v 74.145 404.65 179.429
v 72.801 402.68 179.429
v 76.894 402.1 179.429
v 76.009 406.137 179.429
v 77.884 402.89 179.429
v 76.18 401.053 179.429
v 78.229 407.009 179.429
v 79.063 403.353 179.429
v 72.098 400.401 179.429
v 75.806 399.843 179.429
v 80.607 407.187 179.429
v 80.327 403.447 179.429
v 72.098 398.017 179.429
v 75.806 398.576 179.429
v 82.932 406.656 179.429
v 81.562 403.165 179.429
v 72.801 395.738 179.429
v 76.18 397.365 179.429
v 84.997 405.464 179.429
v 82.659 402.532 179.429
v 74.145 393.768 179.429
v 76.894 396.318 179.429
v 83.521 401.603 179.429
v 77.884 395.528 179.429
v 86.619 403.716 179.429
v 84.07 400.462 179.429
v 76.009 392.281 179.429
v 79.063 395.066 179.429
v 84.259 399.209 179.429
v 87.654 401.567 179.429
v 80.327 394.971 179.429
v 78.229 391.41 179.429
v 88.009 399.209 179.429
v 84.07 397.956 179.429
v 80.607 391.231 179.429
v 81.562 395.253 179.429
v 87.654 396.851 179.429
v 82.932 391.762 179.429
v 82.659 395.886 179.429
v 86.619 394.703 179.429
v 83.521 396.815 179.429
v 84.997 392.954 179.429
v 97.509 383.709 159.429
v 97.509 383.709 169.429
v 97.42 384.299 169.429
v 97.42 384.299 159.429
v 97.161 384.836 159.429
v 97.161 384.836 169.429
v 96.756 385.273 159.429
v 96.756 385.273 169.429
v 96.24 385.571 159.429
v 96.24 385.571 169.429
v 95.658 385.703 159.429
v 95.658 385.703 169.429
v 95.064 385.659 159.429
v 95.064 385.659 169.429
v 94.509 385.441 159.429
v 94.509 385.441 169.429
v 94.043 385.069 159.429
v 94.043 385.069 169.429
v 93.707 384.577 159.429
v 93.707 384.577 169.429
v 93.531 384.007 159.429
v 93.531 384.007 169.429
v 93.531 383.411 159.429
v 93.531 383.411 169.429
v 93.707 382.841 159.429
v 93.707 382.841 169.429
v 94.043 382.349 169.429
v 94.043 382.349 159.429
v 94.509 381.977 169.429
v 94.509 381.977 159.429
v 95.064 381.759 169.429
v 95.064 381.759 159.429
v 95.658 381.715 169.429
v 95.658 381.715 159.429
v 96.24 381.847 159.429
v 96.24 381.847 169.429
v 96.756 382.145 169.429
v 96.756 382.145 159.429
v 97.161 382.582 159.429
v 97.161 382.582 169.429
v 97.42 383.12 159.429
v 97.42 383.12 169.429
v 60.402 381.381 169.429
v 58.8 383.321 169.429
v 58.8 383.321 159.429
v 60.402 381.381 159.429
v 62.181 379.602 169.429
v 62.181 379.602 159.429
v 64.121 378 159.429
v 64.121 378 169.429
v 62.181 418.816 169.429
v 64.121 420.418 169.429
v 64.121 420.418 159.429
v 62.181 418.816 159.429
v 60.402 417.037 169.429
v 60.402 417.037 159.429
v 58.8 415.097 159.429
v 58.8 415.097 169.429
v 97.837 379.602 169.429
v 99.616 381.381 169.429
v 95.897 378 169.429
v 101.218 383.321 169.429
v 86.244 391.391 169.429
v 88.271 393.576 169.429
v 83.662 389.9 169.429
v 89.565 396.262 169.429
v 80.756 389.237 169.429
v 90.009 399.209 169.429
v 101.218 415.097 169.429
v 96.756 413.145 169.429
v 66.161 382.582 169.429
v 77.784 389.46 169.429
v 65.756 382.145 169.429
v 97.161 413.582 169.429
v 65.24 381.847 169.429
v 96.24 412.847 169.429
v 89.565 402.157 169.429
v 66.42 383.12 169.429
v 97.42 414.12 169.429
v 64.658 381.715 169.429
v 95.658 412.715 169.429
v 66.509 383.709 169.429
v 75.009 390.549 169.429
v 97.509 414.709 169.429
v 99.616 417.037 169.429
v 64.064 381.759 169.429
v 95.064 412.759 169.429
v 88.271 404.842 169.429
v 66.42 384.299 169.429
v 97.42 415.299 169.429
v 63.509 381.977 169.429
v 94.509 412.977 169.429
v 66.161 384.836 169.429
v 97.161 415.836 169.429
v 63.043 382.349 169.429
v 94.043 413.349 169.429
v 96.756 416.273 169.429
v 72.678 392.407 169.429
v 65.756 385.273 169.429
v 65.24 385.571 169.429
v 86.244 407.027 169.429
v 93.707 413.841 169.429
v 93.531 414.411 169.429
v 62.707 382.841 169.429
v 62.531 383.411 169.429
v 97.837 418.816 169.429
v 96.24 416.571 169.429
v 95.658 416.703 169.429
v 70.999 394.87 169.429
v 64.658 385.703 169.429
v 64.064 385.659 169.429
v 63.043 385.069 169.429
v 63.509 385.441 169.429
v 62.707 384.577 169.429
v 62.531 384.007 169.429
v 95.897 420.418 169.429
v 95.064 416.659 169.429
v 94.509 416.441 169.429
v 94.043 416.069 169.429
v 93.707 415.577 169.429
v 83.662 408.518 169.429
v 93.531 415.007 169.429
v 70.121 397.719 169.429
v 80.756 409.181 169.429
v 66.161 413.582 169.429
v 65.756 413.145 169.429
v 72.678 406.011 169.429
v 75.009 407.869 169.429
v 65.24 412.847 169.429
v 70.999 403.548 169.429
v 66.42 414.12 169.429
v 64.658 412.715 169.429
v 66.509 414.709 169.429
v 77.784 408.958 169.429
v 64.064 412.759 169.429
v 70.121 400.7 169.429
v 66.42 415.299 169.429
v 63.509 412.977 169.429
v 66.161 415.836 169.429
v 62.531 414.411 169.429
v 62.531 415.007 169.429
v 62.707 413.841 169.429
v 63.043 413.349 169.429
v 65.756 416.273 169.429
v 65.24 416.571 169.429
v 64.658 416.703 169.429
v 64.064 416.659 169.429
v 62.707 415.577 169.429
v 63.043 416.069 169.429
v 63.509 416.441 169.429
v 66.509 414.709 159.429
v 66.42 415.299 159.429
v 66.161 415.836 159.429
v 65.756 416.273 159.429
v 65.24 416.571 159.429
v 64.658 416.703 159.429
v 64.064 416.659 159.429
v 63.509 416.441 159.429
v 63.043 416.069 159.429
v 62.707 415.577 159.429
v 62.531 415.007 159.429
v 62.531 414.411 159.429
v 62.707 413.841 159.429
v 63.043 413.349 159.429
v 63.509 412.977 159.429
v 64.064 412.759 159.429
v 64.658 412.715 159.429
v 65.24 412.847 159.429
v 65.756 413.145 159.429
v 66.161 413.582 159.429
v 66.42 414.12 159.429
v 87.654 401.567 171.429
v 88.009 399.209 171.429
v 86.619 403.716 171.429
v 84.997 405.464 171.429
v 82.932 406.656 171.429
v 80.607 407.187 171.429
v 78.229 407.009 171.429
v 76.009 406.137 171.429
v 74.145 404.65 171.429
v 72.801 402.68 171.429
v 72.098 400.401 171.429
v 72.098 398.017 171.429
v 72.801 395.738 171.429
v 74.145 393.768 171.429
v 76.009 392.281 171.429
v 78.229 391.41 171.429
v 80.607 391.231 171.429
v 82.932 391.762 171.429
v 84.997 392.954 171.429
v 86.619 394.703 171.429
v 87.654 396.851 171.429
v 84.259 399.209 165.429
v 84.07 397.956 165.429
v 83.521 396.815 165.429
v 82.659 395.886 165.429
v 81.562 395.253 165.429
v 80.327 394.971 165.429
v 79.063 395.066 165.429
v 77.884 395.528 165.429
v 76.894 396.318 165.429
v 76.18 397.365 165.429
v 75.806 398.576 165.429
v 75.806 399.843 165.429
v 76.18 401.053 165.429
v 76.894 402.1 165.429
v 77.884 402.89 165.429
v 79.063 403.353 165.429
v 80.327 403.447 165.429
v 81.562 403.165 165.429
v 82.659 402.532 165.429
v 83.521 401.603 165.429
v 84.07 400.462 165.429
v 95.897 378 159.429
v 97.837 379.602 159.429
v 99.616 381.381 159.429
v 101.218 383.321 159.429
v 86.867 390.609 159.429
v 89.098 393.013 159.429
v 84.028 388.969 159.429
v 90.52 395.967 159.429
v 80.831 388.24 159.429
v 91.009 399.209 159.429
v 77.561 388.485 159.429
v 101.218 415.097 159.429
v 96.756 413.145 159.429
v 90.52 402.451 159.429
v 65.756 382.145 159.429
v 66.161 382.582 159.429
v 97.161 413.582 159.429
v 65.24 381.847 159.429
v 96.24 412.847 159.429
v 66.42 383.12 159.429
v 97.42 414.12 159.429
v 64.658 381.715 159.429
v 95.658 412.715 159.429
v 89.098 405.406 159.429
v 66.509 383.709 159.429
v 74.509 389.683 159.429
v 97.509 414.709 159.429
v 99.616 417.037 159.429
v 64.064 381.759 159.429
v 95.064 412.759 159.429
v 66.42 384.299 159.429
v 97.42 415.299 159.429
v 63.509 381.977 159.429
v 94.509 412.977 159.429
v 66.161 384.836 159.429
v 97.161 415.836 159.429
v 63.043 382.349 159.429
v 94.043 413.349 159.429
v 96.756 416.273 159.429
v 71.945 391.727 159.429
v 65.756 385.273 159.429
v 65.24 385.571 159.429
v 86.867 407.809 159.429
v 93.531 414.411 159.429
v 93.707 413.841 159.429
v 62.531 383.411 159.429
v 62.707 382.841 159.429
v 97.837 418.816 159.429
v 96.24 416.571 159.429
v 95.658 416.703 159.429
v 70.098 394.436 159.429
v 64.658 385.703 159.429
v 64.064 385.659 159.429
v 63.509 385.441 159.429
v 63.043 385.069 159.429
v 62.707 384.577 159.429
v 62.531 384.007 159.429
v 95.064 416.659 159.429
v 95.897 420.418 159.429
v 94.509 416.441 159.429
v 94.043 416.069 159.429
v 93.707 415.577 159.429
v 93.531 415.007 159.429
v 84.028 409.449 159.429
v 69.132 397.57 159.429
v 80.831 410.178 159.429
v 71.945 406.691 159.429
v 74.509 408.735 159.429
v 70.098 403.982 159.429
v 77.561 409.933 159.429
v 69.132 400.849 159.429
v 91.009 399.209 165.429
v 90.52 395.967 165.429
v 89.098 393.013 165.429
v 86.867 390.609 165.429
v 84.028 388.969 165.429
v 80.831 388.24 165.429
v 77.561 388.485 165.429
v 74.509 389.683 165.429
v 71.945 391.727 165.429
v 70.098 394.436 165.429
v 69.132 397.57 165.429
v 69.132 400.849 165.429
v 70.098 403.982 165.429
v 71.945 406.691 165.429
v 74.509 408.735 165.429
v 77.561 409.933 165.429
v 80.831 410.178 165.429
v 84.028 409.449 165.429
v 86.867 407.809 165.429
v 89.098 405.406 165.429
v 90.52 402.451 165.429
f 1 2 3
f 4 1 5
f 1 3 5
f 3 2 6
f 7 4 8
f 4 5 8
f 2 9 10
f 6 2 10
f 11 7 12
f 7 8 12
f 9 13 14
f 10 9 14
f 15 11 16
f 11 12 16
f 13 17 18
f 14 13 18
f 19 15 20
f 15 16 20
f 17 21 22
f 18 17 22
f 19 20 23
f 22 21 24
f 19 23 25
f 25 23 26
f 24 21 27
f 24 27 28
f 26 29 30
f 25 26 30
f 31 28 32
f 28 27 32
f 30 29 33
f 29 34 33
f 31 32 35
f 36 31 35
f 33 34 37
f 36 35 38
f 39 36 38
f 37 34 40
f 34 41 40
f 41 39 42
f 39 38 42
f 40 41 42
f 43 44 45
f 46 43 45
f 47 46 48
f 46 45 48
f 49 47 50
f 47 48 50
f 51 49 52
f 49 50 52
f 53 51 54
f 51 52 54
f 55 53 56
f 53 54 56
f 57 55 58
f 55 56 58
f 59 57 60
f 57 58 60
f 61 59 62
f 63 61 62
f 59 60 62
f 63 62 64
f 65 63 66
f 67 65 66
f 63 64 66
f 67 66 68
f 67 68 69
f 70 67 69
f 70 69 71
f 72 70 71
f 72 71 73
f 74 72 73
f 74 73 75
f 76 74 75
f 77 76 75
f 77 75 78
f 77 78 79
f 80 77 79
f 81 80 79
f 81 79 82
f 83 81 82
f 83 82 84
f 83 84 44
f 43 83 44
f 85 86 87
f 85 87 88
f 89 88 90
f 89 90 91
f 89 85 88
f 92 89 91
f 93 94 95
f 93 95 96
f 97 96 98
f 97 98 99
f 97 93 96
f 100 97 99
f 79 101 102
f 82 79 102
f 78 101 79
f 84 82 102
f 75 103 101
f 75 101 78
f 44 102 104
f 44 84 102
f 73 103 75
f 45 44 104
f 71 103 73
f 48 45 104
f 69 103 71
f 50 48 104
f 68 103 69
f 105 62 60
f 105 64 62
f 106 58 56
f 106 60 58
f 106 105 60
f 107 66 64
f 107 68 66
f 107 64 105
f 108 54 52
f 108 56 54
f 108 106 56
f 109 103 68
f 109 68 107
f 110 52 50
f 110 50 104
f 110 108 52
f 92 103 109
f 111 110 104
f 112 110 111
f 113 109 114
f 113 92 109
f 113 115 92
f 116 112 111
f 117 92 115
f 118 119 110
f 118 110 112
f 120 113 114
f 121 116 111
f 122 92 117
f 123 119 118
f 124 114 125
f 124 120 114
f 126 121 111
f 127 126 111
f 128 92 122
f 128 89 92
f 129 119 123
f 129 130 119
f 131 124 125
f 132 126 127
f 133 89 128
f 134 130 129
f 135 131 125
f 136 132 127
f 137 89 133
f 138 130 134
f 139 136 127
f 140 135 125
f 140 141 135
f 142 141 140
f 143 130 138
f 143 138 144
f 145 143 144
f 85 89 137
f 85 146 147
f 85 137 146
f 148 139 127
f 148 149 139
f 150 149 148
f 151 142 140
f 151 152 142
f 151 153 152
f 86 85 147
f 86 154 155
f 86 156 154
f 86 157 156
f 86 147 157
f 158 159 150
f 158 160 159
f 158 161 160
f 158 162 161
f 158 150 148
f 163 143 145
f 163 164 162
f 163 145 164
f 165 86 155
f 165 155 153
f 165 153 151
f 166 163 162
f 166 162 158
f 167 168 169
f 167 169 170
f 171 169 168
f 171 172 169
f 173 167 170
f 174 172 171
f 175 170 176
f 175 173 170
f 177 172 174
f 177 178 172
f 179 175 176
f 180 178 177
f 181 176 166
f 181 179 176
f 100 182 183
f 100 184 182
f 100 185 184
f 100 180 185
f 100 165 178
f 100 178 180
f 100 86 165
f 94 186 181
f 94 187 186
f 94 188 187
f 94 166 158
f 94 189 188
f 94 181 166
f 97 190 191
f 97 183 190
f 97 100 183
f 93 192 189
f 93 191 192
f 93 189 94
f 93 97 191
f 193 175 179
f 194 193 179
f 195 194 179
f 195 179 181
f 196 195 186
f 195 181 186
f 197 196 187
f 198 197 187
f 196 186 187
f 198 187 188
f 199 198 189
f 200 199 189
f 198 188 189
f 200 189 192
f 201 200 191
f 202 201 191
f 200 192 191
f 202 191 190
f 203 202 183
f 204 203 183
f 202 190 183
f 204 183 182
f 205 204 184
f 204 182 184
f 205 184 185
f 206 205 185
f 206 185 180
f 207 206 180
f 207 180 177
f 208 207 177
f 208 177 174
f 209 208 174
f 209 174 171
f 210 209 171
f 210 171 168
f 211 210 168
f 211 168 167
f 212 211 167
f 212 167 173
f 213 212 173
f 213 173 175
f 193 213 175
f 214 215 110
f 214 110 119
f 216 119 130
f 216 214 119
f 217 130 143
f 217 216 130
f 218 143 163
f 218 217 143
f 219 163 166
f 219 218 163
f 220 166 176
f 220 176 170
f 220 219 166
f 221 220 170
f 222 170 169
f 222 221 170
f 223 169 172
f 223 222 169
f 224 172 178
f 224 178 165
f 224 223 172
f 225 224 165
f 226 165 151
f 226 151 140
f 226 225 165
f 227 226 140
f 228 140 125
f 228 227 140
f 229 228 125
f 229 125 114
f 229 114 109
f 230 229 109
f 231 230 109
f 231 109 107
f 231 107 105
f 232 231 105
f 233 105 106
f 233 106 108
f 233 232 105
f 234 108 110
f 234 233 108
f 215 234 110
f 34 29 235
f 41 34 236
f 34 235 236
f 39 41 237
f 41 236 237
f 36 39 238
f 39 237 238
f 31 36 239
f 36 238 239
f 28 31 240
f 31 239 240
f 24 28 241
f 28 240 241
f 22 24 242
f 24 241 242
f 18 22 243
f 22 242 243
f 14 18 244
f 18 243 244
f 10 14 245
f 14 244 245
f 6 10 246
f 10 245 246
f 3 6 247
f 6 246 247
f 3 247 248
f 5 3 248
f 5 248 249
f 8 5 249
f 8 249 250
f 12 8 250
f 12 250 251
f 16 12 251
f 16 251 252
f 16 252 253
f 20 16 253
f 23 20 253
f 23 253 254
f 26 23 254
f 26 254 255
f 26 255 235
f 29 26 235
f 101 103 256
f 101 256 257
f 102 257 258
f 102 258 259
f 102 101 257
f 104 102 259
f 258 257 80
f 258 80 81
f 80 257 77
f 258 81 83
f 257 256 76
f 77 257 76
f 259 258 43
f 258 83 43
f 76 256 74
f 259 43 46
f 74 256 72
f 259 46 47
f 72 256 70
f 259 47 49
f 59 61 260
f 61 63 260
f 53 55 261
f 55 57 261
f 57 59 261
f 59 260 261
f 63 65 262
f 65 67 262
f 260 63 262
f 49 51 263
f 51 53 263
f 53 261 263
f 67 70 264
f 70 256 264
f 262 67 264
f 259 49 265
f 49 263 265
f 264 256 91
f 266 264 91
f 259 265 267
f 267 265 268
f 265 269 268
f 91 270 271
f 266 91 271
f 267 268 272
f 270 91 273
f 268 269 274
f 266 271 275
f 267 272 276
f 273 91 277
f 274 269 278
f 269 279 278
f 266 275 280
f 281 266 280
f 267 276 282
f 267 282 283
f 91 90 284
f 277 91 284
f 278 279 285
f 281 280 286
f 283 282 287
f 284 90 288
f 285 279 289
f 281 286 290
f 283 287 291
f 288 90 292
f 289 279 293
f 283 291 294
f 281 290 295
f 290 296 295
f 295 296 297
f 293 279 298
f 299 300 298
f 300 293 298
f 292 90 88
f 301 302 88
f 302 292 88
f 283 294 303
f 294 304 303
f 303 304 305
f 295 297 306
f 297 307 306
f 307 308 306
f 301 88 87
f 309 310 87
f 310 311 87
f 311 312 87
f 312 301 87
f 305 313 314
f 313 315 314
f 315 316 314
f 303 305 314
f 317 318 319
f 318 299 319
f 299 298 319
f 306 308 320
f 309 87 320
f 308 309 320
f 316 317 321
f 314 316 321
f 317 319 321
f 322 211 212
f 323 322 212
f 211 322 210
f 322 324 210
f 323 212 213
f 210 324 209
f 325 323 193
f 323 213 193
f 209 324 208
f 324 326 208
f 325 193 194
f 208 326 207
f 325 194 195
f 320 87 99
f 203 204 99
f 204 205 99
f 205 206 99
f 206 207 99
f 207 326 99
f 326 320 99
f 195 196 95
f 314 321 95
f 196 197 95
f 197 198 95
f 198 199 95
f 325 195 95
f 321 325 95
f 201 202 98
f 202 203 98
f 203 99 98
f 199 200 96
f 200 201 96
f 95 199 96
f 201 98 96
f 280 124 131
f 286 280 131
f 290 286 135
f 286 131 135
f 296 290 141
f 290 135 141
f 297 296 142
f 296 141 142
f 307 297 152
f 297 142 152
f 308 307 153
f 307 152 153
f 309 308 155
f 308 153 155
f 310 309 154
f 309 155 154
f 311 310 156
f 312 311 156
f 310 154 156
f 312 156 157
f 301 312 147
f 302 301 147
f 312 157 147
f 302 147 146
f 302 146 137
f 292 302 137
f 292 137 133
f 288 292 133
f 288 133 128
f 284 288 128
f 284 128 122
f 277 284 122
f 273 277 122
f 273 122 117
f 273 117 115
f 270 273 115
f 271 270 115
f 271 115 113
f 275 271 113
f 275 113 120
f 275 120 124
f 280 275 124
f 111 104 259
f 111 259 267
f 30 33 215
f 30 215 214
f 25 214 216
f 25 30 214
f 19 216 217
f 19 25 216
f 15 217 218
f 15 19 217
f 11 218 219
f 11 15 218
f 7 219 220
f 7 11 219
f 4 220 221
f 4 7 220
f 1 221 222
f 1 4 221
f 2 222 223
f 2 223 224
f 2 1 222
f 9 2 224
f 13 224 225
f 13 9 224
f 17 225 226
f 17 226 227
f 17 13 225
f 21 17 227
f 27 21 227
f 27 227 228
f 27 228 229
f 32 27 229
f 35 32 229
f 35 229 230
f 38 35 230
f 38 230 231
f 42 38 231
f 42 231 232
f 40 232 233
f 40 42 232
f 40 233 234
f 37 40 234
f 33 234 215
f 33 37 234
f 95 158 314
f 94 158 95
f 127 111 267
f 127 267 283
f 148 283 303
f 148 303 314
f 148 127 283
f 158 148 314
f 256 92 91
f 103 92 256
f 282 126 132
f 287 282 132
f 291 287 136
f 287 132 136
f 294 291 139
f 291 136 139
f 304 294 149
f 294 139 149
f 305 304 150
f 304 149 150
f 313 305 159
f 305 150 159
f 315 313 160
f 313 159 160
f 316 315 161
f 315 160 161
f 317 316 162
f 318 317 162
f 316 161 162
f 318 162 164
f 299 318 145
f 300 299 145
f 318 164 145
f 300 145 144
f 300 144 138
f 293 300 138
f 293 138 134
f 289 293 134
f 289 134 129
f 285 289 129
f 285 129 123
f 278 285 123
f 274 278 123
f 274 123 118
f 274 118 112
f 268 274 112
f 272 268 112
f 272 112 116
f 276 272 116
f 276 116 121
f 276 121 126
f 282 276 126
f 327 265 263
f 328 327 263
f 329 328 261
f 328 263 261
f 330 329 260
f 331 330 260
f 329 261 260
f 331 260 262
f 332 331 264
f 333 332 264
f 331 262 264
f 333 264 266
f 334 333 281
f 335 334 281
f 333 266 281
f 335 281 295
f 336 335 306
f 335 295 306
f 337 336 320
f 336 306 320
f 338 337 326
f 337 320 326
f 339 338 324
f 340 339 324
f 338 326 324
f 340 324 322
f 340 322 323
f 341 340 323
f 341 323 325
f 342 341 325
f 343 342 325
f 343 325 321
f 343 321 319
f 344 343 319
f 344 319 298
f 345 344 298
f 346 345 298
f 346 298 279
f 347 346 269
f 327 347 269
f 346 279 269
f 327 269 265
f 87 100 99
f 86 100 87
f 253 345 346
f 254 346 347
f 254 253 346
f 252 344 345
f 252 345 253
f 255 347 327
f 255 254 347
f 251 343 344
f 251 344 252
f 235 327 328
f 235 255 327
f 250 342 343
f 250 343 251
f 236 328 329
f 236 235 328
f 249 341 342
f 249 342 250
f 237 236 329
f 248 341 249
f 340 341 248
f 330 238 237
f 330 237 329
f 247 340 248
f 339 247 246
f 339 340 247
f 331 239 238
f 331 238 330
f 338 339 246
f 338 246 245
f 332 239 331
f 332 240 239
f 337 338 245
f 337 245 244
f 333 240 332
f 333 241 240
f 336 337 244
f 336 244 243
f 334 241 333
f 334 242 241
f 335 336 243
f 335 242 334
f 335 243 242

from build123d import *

# Parameters (mm, degrees)
PAD_DEPTH       = 10
SKETCH_R        = 13
SKETCH_R_2      = 4.25
PAD001_DEPTH    = 20
PAD001_FACE22_R = 4.25
POCKET_DEPTH    = 6
SKETCH001_R     = 2
POCKET001_DEPTH = 10.0010008506
SKETCH002_R     = 16.036471
SKETCH002_R_2   = 8
POCKET002_DEPTH = 10
CHAMFER_SIZE    = 2


with BuildPart() as part:
    # Binder Face3 → Pad (new)
    with BuildSketch(Plane(origin=(80.0089996426, 399.2090804087, 169.428643648), x_dir=(0, 1, -2.4e-09), z_dir=(-1.8e-08, 2.4e-09, 1))):
        with BuildLine():
            Line((-21.2090002282, 15.8879926146), (-21.2089997718, -15.8879932238))
            ThreePointArc((-21.2089997718, -15.8879932238), (-18.7383294323, -18.7383299706), (-15.8879926146, -21.2090002282))
            Line((-15.8879926146, -21.2090002282), (15.8879932238, -21.2089997718))
            ThreePointArc((15.8879932238, -21.2089997718), (18.7383299706, -18.7383294323), (21.2090002282, -15.8879926146))
            Line((21.2090002282, -15.8879926146), (21.2089997718, 15.8879932238))
            ThreePointArc((21.2089997718, 15.8879932238), (18.7383294323, 18.7383299706), (15.8879926146, 21.2090002282))
            Line((15.8879926146, 21.2090002282), (-15.8879932238, 21.2089997718))
            ThreePointArc((-15.8879932238, 21.2089997718), (-18.7383299706, 18.7383294323), (-21.2090002282, 15.8879926146))
        make_face()
        with BuildLine():
            ThreePointArc((-15.4999997558, -17.0000002226), (-16.9999997774, -15.5000002442), (-15.4999997989, -14.0000002226))
            ThreePointArc((-15.4999997989, -14.0000002226), (-13.9999997774, -15.5000002011), (-15.4999997558, -17.0000002226))
        make_face(mode=Mode.SUBTRACT)
        with BuildLine():
            ThreePointArc((15.5000002442, -16.9999997774), (14.0000002226, -15.4999997989), (15.5000002011, -13.9999997774))
            ThreePointArc((15.5000002011, -13.9999997774), (17.0000002226, -15.4999997558), (15.5000002442, -16.9999997774))
        make_face(mode=Mode.SUBTRACT)
        with BuildLine():
            ThreePointArc((15.4999997989, 14.0000002226), (13.9999997774, 15.5000002011), (15.4999997558, 17.0000002226))
            ThreePointArc((15.4999997558, 17.0000002226), (16.9999997774, 15.5000002442), (15.4999997989, 14.0000002226))
        make_face(mode=Mode.SUBTRACT)
        with BuildLine():
            ThreePointArc((-15.5000002011, 13.9999997774), (-17.0000002226, 15.4999997558), (-15.5000002442, 16.9999997774))
            ThreePointArc((-15.5000002442, 16.9999997774), (-14.0000002226, 15.4999997989), (-15.5000002011, 13.9999997774))
        make_face(mode=Mode.SUBTRACT)
        with BuildLine():
            ThreePointArc((1.58e-07, -11), (-11, -1.58e-07), (-1.58e-07, 11))
            ThreePointArc((-1.58e-07, 11), (11, 1.58e-07), (1.58e-07, -11))
        make_face(mode=Mode.SUBTRACT)
    extrude(amount=-PAD_DEPTH)

    # Sketch (on Face20 of Pad) → Pad001 (join)
    with BuildSketch(Plane(origin=(-2.8643e-06, 3.803e-07, 159.4286431629), x_dir=(1, 0, 1.8e-08), z_dir=(1.8e-08, -2.4e-09, -1))):
        with Locations((80.0090026866, -399.2090800045)):
            Circle(SKETCH_R)
        with Locations((80.0090026866, -399.2090800045)):
            Circle(SKETCH_R_2, mode=Mode.SUBTRACT)
    extrude(amount=-PAD001_DEPTH)

    # Pad001 Face22 → Pocket (cut)
    with BuildSketch(Plane(origin=(80.0089998223, 399.2090803848, 159.428643648), x_dir=(0, -1, 2.4e-09), z_dir=(1.8e-08, -2.4e-09, -1))):
        with BuildLine():
            ThreePointArc((1.58e-07, 11), (-11, 1.58e-07), (-1.58e-07, -11))
            ThreePointArc((-1.58e-07, -11), (11, -1.58e-07), (1.58e-07, 11))
        make_face()
        Circle(PAD001_FACE22_R, mode=Mode.SUBTRACT)
    extrude(amount=-POCKET_DEPTH, mode=Mode.SUBTRACT)

    # Sketch001 (on Face3 of Pocket) → Pocket001 (cut, through all)
    with BuildSketch(Plane(origin=(-3.0439e-06, 4.042e-07, 169.4286431629), x_dir=(1, 0, 1.8e-08), z_dir=(-1.8e-08, 2.4e-09, 1))):
        with Locations((64.509002464, 414.7090797819)):
            Circle(SKETCH001_R)
        with Locations((95.509002464, 414.7090802271)):
            Circle(SKETCH001_R)
        with Locations((95.5090029092, 383.7090802271)):
            Circle(SKETCH001_R)
        with Locations((64.5090029092, 383.7090797819)):
            Circle(SKETCH001_R)
    extrude(amount=-POCKET001_DEPTH, mode=Mode.SUBTRACT)

    # Sketch002 (on Face16 of Pocket001) → Pocket002 (cut)
    with BuildSketch(Plane(origin=(-3.2236e-06, 4.28e-07, 179.4286431629), x_dir=(1, 0, 1.8e-08), z_dir=(-1.8e-08, 2.4e-09, 1))):
        with Locations((80.0090026866, 399.2090800045)):
            Circle(SKETCH002_R)
        with Locations((80.0090026866, 399.2090800045)):
            Circle(SKETCH002_R_2, mode=Mode.SUBTRACT)
    extrude(amount=-POCKET002_DEPTH, mode=Mode.SUBTRACT)

    # Chamfer
    chamfer_edges = [part.edges().sort_by_distance(p)[0] for p in [
        (72.009, 399.20908, 169.428644),
    ]]
    chamfer(chamfer_edges, length=CHAMFER_SIZE)


solid = part.part
